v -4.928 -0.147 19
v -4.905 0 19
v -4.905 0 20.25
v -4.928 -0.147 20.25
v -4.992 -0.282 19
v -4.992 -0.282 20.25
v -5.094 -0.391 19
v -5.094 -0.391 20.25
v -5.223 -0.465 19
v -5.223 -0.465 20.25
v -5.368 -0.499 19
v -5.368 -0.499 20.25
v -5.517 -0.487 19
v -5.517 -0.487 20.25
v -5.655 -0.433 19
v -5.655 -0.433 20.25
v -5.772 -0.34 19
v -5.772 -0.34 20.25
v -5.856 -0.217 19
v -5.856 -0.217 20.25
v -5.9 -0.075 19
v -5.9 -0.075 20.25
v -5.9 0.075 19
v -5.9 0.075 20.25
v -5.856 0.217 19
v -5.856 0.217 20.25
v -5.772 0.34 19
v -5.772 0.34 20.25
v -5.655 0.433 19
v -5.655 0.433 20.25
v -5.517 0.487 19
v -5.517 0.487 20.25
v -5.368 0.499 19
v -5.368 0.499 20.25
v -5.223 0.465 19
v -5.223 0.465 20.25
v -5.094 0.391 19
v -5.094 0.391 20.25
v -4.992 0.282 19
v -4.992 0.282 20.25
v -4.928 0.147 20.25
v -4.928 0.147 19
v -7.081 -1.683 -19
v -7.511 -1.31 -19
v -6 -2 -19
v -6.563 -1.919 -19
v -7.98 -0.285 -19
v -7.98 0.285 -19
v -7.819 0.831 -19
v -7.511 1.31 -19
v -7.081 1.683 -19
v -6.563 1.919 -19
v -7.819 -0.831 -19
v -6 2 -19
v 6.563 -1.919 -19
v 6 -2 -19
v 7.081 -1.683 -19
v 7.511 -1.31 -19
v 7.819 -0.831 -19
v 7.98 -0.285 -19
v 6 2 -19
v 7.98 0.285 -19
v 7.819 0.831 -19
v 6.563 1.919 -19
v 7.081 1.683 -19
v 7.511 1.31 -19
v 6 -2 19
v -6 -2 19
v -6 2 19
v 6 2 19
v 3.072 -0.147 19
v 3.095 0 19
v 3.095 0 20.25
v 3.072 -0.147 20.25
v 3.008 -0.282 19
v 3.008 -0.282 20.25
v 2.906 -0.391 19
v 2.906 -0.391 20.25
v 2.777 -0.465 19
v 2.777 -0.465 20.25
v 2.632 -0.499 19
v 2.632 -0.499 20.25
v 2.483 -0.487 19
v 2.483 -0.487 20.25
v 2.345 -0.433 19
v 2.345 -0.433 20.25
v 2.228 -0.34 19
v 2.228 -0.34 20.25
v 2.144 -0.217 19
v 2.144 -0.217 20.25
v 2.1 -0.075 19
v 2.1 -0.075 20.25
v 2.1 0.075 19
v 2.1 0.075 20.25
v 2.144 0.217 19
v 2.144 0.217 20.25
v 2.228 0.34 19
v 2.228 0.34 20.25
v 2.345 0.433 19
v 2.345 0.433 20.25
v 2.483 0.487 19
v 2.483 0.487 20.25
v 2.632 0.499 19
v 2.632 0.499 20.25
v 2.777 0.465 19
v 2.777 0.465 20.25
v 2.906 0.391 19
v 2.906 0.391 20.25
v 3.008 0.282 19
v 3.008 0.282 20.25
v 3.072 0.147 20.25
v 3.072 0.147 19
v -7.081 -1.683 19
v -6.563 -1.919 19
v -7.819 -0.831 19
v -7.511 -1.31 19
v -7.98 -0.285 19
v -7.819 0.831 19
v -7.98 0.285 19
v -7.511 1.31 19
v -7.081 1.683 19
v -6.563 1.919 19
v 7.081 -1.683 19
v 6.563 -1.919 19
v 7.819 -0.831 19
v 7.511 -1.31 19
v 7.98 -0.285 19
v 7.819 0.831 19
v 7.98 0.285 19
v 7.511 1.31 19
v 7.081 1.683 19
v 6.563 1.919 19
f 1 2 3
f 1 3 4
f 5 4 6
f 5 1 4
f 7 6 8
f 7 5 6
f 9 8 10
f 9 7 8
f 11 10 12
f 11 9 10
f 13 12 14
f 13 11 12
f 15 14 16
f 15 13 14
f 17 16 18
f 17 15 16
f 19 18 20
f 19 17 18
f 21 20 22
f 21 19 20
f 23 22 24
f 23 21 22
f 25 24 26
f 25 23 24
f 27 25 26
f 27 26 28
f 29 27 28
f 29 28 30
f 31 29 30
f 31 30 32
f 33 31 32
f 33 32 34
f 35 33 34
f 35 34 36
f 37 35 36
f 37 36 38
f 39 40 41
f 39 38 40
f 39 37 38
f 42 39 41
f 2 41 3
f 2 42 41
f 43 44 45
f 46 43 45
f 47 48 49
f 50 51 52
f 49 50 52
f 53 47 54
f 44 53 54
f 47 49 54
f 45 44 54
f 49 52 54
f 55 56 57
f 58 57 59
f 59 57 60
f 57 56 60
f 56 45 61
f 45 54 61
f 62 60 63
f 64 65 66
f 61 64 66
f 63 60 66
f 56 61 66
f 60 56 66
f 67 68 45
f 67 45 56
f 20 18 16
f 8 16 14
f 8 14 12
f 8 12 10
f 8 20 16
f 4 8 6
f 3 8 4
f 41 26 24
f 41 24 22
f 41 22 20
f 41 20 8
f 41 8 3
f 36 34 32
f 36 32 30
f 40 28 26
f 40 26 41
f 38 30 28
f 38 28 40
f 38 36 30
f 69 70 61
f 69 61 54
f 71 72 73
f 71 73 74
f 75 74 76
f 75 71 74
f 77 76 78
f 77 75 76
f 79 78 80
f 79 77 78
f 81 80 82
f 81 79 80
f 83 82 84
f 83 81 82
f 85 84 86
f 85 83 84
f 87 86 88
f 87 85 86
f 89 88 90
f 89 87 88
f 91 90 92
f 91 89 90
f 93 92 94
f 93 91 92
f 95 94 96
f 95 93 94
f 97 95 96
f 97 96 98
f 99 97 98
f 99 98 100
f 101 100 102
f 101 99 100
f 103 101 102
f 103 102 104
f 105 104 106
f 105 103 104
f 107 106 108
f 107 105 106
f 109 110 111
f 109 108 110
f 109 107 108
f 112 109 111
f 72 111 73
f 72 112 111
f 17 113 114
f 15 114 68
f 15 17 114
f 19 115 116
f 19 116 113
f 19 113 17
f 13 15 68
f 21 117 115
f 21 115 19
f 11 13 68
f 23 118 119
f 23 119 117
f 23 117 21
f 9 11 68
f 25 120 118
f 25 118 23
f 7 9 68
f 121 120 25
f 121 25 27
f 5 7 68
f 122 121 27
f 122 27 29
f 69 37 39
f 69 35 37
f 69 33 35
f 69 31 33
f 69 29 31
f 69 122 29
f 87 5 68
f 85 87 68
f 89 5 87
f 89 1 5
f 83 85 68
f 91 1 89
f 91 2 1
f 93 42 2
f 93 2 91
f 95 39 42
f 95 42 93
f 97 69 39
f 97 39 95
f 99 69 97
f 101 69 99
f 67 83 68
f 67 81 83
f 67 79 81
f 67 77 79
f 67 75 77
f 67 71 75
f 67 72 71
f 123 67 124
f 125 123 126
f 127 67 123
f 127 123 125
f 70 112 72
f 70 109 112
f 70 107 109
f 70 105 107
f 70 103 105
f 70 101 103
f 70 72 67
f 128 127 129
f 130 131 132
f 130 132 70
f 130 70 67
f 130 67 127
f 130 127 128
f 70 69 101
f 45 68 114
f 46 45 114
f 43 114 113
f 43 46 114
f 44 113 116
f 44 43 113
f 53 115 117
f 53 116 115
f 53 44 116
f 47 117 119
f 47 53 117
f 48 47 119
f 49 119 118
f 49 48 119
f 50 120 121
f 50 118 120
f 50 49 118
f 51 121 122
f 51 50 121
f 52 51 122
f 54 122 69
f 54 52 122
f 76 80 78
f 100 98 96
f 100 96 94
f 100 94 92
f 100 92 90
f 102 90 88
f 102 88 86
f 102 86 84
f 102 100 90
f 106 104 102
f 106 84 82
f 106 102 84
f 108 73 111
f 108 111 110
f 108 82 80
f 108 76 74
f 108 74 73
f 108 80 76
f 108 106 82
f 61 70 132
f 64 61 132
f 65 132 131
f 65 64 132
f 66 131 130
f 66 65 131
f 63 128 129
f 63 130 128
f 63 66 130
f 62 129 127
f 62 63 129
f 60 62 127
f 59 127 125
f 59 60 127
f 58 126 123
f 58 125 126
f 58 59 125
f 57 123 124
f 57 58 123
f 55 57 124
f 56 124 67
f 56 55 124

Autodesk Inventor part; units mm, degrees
ref_plane "YZ Plane" through (0, 0, 0) normal (1, 0, 0) x (0, 1, 0)
ref_plane "XZ Plane" through (0, 0, 0) normal (0, 1, 0) x (-1, 0, 0)
ref_plane "XY Plane" through (0, 0, 0) normal (0, 0, 1) x (1, 0, 0)
sketch "Sketch1" plane through (0, 0, 0) normal (0, 0, 1) x (1, 0, 0)
  line L0 (-6, 0) -> (6, 0) construction
  line L1 (-6, -2) -> (6, -2)
  line L2 (6, 2) -> (-6, 2)
  arc A0 (-6, 2) -> (-6, -2) centre (-6, 0) ccw
  arc A1 (6, -2) -> (6, 2) centre (6, 0) ccw
  point P0 (0, 0)
  point P1 (0, 0)
  point P2 (-8, 0)
  point P3 (8, 0)
  dimension "d0" = 4
  dimension "d1" = 16
extrude "Extrusion1" add sketch "Sketch1" along normal mid plane 38
sketch "Sketch2" plane through (0, 0, 19) normal (0, 0, 1) x (1, 0, 0)
  circle A0 centre (2.5947, 0) radius 0.5
  circle A1 centre (-5.4053, 0) radius 0.5
  point P0 (0, 0)
  dimension "d4" = 8
  dimension "d5" = 1
extrude "Extrusion2" add sketch "Sketch2" along normal blind 1.25
properties part number "battery"
